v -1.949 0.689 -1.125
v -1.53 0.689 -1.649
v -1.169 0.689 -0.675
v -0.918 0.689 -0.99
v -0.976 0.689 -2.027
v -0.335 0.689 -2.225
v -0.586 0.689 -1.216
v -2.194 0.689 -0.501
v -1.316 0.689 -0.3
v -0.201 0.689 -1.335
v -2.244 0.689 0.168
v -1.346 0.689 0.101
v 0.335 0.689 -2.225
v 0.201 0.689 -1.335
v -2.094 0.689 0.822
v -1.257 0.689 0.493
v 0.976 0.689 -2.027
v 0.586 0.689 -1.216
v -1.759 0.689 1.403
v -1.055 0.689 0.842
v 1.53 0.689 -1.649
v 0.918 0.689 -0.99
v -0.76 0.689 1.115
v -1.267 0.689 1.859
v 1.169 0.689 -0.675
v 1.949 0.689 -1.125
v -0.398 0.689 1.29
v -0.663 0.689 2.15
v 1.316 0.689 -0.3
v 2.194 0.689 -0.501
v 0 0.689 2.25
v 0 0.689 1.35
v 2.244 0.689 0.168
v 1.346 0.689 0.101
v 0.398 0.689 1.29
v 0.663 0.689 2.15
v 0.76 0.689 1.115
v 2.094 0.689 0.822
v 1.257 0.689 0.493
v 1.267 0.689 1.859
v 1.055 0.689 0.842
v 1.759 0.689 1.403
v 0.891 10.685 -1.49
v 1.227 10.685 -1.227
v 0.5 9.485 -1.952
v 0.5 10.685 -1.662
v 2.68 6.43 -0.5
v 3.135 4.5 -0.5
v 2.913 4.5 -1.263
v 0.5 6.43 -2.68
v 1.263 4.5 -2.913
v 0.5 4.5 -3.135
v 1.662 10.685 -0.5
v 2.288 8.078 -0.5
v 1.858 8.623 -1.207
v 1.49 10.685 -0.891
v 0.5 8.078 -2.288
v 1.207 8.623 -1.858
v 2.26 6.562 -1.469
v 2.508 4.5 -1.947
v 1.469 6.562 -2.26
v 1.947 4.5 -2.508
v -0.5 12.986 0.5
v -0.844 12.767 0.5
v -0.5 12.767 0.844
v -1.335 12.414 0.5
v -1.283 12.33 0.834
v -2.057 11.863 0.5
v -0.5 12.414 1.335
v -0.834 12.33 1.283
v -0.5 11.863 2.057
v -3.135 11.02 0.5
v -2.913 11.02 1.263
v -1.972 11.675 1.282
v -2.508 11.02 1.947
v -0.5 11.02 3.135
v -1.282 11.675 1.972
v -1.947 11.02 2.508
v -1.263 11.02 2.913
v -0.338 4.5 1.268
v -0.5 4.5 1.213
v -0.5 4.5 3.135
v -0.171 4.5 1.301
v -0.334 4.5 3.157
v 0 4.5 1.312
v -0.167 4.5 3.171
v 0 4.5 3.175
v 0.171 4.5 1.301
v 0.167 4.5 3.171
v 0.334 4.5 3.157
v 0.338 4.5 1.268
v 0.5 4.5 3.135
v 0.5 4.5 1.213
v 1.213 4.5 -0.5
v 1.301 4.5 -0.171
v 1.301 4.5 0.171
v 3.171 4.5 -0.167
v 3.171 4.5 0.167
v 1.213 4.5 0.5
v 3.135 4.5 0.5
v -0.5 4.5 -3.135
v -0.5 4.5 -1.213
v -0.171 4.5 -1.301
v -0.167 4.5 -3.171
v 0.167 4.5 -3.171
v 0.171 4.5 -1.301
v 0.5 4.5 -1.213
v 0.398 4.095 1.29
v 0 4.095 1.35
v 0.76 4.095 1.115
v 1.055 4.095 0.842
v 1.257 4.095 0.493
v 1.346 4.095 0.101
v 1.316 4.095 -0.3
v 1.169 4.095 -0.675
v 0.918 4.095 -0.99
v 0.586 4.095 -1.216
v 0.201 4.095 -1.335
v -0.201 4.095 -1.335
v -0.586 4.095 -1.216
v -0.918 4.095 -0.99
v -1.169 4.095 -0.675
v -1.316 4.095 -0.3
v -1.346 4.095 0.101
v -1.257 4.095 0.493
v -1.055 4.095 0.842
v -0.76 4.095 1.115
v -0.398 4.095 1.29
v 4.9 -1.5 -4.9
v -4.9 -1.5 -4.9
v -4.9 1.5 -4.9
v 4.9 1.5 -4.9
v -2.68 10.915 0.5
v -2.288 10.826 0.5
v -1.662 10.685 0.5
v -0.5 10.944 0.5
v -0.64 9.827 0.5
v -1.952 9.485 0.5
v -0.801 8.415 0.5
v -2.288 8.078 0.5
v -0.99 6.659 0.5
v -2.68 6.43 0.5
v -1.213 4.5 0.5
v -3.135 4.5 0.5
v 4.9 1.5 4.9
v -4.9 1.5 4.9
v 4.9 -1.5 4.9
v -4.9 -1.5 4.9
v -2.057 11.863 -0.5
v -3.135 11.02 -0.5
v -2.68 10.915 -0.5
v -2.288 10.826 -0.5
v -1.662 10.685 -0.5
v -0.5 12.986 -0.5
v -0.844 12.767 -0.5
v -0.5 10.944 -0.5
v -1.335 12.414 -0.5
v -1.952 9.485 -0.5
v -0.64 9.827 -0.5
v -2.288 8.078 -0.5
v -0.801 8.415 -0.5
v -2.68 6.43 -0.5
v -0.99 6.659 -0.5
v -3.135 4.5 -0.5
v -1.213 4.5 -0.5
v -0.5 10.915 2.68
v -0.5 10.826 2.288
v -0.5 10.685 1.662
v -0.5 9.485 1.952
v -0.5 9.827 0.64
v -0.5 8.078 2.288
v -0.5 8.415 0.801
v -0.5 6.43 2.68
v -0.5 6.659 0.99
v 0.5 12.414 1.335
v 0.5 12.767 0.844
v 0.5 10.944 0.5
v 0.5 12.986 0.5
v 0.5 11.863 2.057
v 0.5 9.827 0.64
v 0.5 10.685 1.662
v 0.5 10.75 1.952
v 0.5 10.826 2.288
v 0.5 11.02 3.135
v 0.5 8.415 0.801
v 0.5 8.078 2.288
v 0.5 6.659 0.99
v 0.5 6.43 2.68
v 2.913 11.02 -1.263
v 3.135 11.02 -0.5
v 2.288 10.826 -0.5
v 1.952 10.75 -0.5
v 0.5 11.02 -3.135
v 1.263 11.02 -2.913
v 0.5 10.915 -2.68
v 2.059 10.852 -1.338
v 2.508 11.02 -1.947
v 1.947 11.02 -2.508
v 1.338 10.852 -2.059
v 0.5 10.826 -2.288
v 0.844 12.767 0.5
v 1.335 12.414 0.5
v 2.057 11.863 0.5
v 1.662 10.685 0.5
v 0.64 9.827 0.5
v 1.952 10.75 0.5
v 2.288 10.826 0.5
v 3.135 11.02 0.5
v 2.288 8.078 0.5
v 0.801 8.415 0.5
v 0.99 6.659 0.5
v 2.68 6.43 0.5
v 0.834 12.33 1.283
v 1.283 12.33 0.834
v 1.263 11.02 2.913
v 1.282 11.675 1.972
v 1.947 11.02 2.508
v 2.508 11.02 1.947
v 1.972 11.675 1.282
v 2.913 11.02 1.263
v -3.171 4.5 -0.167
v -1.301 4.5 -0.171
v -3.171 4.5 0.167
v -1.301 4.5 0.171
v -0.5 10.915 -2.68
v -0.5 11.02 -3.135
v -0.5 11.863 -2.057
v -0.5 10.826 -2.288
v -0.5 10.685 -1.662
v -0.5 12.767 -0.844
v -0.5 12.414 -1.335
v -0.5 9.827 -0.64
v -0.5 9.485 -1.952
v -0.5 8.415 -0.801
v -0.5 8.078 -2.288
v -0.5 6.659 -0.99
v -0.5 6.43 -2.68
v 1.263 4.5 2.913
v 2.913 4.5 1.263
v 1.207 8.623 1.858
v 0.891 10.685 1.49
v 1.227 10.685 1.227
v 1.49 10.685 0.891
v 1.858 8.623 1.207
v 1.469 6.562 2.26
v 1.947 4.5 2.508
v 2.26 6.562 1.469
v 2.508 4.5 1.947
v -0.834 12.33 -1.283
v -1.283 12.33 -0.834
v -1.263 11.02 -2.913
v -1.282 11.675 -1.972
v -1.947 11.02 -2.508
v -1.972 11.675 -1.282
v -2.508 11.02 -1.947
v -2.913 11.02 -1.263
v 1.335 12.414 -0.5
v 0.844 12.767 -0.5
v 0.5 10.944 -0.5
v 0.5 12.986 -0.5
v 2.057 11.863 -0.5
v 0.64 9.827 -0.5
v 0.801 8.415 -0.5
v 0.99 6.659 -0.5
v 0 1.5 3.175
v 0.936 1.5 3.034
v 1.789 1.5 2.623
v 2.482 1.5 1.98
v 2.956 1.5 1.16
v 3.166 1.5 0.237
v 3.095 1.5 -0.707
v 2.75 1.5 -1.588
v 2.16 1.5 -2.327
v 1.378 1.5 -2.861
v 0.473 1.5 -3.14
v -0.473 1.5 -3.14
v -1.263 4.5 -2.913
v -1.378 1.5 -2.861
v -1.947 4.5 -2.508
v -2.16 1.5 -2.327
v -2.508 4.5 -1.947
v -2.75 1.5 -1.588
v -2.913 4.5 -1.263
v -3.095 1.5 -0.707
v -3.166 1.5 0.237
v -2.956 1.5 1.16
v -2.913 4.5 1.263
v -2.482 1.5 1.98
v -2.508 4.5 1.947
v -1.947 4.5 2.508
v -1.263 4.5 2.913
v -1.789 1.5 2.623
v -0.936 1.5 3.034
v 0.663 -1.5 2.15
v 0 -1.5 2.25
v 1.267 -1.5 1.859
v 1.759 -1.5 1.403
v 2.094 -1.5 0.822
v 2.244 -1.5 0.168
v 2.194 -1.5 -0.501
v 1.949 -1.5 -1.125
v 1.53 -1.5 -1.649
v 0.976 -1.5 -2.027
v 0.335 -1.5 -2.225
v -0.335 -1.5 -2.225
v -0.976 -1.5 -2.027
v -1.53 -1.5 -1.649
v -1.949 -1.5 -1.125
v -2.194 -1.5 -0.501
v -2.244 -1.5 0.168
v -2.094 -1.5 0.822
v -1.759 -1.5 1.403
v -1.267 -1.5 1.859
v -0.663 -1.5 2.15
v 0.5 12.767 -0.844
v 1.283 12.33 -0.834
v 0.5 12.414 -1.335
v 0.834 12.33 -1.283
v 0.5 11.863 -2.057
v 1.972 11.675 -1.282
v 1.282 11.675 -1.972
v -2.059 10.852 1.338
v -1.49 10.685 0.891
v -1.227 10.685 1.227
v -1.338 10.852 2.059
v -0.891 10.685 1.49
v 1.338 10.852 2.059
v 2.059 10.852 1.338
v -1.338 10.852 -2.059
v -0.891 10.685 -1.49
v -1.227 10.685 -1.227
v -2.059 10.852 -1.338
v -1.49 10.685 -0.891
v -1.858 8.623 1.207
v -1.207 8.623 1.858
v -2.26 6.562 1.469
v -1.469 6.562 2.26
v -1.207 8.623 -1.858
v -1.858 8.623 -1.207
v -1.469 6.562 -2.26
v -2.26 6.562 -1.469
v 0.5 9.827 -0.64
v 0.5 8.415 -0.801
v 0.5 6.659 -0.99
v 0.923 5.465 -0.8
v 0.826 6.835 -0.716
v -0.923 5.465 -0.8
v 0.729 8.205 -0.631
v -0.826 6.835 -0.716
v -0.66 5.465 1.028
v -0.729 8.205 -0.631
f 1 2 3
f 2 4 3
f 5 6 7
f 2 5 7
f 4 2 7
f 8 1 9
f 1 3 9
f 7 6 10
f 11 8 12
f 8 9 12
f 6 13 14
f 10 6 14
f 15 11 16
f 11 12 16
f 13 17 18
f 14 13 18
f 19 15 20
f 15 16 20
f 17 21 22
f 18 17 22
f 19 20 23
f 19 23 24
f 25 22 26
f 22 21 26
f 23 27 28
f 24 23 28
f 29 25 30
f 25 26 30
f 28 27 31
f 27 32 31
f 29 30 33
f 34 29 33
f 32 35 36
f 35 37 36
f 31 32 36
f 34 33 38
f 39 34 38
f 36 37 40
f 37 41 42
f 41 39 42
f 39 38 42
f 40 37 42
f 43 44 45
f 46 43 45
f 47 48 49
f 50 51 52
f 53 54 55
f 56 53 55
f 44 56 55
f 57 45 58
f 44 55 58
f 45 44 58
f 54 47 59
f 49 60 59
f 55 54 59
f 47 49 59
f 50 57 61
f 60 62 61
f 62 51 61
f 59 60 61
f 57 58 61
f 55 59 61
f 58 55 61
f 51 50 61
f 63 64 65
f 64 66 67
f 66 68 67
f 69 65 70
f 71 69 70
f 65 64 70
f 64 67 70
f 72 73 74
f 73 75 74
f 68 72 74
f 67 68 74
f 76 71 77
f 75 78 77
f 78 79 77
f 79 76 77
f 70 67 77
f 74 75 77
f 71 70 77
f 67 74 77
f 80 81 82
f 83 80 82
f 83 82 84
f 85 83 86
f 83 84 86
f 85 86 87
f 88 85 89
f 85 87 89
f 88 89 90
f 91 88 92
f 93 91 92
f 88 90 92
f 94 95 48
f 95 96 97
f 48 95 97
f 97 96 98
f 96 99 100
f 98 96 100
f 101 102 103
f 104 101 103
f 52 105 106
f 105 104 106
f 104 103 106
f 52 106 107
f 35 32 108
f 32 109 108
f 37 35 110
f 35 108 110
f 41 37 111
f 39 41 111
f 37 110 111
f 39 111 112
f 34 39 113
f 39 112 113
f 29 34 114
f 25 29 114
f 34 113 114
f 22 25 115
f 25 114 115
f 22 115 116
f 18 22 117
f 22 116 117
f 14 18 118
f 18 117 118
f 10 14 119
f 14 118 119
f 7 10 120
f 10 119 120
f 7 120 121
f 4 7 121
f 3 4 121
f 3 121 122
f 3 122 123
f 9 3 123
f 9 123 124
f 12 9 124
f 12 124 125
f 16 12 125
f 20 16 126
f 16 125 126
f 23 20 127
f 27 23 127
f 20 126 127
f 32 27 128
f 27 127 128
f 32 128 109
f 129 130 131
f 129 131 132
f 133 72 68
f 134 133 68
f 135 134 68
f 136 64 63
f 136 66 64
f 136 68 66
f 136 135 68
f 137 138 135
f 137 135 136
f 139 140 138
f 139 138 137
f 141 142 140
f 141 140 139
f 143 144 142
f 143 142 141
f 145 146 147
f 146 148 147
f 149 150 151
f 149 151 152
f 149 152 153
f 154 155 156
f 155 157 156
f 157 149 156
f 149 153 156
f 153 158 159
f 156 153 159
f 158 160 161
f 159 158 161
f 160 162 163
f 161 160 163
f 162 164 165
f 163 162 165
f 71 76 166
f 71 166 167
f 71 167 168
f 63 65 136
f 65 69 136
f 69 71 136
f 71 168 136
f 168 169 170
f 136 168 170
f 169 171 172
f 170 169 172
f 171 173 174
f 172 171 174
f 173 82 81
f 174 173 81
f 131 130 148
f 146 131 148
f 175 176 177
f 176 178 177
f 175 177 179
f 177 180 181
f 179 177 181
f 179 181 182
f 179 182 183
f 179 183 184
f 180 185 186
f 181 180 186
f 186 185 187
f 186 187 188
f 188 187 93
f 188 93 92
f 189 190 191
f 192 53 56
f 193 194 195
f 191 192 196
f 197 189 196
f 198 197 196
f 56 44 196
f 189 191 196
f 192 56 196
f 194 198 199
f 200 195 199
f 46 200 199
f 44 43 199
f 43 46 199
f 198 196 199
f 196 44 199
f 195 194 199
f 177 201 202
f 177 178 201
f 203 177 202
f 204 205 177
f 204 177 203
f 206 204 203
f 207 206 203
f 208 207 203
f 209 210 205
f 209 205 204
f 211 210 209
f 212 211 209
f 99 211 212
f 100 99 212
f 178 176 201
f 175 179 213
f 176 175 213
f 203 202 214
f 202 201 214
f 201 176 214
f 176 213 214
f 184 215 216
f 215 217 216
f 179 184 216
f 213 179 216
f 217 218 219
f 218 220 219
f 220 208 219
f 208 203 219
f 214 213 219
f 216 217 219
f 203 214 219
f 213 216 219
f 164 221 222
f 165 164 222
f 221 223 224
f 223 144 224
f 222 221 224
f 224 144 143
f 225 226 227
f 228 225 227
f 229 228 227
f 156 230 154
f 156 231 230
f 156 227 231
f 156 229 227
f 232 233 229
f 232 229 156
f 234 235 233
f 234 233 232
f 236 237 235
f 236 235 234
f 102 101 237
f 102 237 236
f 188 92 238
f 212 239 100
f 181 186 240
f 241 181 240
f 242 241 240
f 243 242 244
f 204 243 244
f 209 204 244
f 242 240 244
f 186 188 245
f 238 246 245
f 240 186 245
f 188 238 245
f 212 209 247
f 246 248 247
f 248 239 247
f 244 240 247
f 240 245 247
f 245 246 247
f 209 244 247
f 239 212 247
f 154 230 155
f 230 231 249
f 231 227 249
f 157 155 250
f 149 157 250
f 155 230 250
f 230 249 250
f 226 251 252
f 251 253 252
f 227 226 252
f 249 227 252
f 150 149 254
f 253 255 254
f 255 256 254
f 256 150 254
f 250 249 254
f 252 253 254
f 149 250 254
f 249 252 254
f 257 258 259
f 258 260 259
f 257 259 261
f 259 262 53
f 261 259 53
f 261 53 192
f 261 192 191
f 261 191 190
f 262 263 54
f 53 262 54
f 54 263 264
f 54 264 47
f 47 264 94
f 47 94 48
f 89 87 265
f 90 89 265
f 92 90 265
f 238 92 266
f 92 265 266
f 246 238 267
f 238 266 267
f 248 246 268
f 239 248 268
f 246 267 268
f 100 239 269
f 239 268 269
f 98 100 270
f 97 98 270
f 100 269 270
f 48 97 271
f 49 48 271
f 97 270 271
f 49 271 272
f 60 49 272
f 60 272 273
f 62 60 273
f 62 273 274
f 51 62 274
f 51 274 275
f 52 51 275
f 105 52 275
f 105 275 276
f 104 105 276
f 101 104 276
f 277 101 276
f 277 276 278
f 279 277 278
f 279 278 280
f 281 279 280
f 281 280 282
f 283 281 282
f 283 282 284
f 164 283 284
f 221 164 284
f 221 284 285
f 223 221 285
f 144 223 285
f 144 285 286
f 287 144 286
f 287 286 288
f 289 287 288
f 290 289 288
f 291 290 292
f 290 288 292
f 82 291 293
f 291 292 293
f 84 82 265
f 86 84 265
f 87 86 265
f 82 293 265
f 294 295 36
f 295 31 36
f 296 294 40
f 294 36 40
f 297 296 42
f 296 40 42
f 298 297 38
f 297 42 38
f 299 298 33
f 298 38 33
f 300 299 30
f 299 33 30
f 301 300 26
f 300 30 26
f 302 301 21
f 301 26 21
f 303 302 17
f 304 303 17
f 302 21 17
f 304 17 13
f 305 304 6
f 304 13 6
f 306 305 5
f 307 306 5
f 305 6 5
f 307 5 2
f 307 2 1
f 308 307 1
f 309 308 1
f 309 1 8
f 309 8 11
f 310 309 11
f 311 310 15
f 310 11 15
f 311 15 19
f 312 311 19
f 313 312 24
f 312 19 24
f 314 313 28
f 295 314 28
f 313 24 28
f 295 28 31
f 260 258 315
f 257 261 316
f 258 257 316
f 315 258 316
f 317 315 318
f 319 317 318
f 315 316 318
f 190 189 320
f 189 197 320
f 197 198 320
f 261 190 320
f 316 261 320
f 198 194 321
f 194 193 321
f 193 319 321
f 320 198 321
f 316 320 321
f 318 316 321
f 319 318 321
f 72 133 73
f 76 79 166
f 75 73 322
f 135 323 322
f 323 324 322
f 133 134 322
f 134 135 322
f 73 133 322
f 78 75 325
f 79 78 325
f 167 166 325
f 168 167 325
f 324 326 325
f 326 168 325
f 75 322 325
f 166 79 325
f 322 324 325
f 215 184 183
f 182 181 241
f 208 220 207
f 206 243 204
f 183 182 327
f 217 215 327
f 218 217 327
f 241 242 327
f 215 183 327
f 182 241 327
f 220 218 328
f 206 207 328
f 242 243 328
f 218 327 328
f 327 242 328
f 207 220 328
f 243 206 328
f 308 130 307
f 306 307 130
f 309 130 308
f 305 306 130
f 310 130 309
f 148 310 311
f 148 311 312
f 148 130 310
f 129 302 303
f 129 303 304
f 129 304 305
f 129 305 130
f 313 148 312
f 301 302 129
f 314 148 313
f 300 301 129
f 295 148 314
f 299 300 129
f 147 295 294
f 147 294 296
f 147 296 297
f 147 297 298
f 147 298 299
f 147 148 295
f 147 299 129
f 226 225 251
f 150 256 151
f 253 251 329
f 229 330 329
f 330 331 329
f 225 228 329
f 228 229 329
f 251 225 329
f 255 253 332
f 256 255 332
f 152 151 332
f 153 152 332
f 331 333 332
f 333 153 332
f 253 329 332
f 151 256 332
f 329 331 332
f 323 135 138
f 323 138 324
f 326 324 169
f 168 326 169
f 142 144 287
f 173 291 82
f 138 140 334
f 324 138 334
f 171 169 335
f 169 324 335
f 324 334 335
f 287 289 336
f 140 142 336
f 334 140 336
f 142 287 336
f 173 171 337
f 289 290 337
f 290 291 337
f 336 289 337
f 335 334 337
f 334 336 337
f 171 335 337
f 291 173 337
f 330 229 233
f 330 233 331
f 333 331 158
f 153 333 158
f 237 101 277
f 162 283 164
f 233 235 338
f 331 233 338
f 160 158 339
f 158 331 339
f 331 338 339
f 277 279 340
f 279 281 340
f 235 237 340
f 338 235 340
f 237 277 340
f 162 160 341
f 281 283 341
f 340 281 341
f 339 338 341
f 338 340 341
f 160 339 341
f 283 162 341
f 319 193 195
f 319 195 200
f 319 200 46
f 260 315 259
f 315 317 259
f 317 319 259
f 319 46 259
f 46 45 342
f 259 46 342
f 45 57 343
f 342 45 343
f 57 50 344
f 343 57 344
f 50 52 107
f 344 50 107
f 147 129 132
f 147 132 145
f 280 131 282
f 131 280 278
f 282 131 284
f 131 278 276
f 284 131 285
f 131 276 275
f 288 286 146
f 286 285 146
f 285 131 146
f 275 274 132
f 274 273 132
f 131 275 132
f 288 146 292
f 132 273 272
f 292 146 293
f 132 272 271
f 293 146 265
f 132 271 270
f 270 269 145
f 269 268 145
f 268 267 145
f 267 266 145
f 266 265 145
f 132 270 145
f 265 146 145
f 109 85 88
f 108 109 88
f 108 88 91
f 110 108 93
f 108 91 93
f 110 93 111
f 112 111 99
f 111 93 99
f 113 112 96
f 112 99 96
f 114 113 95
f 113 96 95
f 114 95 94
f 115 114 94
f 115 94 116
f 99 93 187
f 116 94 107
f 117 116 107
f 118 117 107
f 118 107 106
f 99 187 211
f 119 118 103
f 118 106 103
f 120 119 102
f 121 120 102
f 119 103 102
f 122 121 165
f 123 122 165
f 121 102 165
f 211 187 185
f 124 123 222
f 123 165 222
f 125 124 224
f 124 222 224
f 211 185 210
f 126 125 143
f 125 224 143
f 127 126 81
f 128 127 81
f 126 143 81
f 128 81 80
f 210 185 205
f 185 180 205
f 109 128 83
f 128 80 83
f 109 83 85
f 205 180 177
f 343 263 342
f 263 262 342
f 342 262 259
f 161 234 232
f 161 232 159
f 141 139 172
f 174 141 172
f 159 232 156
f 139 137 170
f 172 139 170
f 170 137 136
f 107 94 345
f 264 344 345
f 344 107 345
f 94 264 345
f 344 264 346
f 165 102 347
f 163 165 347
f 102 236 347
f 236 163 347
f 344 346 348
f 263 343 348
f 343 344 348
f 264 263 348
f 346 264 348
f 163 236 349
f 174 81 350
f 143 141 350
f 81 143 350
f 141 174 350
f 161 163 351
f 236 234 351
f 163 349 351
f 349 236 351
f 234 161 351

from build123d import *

# Parameters (mm, degrees)
F0_W     = 9.8
F0_H     = 9.8
F0_R     = 2.75
F3_DEPTH = 1.5
F5_START = -4.5
F4_W     = 1
F4_H     = 4.5
F4_H_2   = 1
F4_W_2   = 4.5
F5_DEPTH = 20.5


# Not quite as in the source:
# - a feature names something its author has since deleted; it is built from what else it names


with BuildPart() as f2:
    # F1 (on Right) → F2 (revolve)
    with BuildSketch(Plane.YZ):
        Polygon((4.5, 3.175), (-1.5, 3.175), (-1.5, 2.25), (0.6892941068, 2.25), (0.6892941068, 1.35), (4.0952532458, 1.35), (13.1507472004, 0.5), (11.0196430301, 3.175), (10.6847711314, 1.7358662147), align=None)
    revolve(axis=Axis((0, 11.4737532458, 0), (0, 1, 0)))

    # F0 (on Front) → F3 (join, symmetric)
    with BuildSketch(Plane.XZ):
        Rectangle(F0_W, F0_H)
        Circle(F0_R, mode=Mode.SUBTRACT)
    extrude(amount=F3_DEPTH, both=True)

    # F4 (on Front) → F5 (cut)
    with BuildSketch(Plane.XZ.offset(F5_START)):
        with Locations((0, 2.75)):
            Rectangle(F4_W, F4_H)
        Rectangle(F4_W, F4_H_2)
        with Locations((-2.75, 0)):
            Rectangle(F4_W_2, F4_H_2)
        with Locations((2.75, 0)):
            Rectangle(F4_W_2, F4_H_2)
        with Locations((0, -2.75)):
            Rectangle(F4_W, F4_H)
    extrude(amount=-F5_DEPTH, mode=Mode.SUBTRACT)


solid = f2.part
